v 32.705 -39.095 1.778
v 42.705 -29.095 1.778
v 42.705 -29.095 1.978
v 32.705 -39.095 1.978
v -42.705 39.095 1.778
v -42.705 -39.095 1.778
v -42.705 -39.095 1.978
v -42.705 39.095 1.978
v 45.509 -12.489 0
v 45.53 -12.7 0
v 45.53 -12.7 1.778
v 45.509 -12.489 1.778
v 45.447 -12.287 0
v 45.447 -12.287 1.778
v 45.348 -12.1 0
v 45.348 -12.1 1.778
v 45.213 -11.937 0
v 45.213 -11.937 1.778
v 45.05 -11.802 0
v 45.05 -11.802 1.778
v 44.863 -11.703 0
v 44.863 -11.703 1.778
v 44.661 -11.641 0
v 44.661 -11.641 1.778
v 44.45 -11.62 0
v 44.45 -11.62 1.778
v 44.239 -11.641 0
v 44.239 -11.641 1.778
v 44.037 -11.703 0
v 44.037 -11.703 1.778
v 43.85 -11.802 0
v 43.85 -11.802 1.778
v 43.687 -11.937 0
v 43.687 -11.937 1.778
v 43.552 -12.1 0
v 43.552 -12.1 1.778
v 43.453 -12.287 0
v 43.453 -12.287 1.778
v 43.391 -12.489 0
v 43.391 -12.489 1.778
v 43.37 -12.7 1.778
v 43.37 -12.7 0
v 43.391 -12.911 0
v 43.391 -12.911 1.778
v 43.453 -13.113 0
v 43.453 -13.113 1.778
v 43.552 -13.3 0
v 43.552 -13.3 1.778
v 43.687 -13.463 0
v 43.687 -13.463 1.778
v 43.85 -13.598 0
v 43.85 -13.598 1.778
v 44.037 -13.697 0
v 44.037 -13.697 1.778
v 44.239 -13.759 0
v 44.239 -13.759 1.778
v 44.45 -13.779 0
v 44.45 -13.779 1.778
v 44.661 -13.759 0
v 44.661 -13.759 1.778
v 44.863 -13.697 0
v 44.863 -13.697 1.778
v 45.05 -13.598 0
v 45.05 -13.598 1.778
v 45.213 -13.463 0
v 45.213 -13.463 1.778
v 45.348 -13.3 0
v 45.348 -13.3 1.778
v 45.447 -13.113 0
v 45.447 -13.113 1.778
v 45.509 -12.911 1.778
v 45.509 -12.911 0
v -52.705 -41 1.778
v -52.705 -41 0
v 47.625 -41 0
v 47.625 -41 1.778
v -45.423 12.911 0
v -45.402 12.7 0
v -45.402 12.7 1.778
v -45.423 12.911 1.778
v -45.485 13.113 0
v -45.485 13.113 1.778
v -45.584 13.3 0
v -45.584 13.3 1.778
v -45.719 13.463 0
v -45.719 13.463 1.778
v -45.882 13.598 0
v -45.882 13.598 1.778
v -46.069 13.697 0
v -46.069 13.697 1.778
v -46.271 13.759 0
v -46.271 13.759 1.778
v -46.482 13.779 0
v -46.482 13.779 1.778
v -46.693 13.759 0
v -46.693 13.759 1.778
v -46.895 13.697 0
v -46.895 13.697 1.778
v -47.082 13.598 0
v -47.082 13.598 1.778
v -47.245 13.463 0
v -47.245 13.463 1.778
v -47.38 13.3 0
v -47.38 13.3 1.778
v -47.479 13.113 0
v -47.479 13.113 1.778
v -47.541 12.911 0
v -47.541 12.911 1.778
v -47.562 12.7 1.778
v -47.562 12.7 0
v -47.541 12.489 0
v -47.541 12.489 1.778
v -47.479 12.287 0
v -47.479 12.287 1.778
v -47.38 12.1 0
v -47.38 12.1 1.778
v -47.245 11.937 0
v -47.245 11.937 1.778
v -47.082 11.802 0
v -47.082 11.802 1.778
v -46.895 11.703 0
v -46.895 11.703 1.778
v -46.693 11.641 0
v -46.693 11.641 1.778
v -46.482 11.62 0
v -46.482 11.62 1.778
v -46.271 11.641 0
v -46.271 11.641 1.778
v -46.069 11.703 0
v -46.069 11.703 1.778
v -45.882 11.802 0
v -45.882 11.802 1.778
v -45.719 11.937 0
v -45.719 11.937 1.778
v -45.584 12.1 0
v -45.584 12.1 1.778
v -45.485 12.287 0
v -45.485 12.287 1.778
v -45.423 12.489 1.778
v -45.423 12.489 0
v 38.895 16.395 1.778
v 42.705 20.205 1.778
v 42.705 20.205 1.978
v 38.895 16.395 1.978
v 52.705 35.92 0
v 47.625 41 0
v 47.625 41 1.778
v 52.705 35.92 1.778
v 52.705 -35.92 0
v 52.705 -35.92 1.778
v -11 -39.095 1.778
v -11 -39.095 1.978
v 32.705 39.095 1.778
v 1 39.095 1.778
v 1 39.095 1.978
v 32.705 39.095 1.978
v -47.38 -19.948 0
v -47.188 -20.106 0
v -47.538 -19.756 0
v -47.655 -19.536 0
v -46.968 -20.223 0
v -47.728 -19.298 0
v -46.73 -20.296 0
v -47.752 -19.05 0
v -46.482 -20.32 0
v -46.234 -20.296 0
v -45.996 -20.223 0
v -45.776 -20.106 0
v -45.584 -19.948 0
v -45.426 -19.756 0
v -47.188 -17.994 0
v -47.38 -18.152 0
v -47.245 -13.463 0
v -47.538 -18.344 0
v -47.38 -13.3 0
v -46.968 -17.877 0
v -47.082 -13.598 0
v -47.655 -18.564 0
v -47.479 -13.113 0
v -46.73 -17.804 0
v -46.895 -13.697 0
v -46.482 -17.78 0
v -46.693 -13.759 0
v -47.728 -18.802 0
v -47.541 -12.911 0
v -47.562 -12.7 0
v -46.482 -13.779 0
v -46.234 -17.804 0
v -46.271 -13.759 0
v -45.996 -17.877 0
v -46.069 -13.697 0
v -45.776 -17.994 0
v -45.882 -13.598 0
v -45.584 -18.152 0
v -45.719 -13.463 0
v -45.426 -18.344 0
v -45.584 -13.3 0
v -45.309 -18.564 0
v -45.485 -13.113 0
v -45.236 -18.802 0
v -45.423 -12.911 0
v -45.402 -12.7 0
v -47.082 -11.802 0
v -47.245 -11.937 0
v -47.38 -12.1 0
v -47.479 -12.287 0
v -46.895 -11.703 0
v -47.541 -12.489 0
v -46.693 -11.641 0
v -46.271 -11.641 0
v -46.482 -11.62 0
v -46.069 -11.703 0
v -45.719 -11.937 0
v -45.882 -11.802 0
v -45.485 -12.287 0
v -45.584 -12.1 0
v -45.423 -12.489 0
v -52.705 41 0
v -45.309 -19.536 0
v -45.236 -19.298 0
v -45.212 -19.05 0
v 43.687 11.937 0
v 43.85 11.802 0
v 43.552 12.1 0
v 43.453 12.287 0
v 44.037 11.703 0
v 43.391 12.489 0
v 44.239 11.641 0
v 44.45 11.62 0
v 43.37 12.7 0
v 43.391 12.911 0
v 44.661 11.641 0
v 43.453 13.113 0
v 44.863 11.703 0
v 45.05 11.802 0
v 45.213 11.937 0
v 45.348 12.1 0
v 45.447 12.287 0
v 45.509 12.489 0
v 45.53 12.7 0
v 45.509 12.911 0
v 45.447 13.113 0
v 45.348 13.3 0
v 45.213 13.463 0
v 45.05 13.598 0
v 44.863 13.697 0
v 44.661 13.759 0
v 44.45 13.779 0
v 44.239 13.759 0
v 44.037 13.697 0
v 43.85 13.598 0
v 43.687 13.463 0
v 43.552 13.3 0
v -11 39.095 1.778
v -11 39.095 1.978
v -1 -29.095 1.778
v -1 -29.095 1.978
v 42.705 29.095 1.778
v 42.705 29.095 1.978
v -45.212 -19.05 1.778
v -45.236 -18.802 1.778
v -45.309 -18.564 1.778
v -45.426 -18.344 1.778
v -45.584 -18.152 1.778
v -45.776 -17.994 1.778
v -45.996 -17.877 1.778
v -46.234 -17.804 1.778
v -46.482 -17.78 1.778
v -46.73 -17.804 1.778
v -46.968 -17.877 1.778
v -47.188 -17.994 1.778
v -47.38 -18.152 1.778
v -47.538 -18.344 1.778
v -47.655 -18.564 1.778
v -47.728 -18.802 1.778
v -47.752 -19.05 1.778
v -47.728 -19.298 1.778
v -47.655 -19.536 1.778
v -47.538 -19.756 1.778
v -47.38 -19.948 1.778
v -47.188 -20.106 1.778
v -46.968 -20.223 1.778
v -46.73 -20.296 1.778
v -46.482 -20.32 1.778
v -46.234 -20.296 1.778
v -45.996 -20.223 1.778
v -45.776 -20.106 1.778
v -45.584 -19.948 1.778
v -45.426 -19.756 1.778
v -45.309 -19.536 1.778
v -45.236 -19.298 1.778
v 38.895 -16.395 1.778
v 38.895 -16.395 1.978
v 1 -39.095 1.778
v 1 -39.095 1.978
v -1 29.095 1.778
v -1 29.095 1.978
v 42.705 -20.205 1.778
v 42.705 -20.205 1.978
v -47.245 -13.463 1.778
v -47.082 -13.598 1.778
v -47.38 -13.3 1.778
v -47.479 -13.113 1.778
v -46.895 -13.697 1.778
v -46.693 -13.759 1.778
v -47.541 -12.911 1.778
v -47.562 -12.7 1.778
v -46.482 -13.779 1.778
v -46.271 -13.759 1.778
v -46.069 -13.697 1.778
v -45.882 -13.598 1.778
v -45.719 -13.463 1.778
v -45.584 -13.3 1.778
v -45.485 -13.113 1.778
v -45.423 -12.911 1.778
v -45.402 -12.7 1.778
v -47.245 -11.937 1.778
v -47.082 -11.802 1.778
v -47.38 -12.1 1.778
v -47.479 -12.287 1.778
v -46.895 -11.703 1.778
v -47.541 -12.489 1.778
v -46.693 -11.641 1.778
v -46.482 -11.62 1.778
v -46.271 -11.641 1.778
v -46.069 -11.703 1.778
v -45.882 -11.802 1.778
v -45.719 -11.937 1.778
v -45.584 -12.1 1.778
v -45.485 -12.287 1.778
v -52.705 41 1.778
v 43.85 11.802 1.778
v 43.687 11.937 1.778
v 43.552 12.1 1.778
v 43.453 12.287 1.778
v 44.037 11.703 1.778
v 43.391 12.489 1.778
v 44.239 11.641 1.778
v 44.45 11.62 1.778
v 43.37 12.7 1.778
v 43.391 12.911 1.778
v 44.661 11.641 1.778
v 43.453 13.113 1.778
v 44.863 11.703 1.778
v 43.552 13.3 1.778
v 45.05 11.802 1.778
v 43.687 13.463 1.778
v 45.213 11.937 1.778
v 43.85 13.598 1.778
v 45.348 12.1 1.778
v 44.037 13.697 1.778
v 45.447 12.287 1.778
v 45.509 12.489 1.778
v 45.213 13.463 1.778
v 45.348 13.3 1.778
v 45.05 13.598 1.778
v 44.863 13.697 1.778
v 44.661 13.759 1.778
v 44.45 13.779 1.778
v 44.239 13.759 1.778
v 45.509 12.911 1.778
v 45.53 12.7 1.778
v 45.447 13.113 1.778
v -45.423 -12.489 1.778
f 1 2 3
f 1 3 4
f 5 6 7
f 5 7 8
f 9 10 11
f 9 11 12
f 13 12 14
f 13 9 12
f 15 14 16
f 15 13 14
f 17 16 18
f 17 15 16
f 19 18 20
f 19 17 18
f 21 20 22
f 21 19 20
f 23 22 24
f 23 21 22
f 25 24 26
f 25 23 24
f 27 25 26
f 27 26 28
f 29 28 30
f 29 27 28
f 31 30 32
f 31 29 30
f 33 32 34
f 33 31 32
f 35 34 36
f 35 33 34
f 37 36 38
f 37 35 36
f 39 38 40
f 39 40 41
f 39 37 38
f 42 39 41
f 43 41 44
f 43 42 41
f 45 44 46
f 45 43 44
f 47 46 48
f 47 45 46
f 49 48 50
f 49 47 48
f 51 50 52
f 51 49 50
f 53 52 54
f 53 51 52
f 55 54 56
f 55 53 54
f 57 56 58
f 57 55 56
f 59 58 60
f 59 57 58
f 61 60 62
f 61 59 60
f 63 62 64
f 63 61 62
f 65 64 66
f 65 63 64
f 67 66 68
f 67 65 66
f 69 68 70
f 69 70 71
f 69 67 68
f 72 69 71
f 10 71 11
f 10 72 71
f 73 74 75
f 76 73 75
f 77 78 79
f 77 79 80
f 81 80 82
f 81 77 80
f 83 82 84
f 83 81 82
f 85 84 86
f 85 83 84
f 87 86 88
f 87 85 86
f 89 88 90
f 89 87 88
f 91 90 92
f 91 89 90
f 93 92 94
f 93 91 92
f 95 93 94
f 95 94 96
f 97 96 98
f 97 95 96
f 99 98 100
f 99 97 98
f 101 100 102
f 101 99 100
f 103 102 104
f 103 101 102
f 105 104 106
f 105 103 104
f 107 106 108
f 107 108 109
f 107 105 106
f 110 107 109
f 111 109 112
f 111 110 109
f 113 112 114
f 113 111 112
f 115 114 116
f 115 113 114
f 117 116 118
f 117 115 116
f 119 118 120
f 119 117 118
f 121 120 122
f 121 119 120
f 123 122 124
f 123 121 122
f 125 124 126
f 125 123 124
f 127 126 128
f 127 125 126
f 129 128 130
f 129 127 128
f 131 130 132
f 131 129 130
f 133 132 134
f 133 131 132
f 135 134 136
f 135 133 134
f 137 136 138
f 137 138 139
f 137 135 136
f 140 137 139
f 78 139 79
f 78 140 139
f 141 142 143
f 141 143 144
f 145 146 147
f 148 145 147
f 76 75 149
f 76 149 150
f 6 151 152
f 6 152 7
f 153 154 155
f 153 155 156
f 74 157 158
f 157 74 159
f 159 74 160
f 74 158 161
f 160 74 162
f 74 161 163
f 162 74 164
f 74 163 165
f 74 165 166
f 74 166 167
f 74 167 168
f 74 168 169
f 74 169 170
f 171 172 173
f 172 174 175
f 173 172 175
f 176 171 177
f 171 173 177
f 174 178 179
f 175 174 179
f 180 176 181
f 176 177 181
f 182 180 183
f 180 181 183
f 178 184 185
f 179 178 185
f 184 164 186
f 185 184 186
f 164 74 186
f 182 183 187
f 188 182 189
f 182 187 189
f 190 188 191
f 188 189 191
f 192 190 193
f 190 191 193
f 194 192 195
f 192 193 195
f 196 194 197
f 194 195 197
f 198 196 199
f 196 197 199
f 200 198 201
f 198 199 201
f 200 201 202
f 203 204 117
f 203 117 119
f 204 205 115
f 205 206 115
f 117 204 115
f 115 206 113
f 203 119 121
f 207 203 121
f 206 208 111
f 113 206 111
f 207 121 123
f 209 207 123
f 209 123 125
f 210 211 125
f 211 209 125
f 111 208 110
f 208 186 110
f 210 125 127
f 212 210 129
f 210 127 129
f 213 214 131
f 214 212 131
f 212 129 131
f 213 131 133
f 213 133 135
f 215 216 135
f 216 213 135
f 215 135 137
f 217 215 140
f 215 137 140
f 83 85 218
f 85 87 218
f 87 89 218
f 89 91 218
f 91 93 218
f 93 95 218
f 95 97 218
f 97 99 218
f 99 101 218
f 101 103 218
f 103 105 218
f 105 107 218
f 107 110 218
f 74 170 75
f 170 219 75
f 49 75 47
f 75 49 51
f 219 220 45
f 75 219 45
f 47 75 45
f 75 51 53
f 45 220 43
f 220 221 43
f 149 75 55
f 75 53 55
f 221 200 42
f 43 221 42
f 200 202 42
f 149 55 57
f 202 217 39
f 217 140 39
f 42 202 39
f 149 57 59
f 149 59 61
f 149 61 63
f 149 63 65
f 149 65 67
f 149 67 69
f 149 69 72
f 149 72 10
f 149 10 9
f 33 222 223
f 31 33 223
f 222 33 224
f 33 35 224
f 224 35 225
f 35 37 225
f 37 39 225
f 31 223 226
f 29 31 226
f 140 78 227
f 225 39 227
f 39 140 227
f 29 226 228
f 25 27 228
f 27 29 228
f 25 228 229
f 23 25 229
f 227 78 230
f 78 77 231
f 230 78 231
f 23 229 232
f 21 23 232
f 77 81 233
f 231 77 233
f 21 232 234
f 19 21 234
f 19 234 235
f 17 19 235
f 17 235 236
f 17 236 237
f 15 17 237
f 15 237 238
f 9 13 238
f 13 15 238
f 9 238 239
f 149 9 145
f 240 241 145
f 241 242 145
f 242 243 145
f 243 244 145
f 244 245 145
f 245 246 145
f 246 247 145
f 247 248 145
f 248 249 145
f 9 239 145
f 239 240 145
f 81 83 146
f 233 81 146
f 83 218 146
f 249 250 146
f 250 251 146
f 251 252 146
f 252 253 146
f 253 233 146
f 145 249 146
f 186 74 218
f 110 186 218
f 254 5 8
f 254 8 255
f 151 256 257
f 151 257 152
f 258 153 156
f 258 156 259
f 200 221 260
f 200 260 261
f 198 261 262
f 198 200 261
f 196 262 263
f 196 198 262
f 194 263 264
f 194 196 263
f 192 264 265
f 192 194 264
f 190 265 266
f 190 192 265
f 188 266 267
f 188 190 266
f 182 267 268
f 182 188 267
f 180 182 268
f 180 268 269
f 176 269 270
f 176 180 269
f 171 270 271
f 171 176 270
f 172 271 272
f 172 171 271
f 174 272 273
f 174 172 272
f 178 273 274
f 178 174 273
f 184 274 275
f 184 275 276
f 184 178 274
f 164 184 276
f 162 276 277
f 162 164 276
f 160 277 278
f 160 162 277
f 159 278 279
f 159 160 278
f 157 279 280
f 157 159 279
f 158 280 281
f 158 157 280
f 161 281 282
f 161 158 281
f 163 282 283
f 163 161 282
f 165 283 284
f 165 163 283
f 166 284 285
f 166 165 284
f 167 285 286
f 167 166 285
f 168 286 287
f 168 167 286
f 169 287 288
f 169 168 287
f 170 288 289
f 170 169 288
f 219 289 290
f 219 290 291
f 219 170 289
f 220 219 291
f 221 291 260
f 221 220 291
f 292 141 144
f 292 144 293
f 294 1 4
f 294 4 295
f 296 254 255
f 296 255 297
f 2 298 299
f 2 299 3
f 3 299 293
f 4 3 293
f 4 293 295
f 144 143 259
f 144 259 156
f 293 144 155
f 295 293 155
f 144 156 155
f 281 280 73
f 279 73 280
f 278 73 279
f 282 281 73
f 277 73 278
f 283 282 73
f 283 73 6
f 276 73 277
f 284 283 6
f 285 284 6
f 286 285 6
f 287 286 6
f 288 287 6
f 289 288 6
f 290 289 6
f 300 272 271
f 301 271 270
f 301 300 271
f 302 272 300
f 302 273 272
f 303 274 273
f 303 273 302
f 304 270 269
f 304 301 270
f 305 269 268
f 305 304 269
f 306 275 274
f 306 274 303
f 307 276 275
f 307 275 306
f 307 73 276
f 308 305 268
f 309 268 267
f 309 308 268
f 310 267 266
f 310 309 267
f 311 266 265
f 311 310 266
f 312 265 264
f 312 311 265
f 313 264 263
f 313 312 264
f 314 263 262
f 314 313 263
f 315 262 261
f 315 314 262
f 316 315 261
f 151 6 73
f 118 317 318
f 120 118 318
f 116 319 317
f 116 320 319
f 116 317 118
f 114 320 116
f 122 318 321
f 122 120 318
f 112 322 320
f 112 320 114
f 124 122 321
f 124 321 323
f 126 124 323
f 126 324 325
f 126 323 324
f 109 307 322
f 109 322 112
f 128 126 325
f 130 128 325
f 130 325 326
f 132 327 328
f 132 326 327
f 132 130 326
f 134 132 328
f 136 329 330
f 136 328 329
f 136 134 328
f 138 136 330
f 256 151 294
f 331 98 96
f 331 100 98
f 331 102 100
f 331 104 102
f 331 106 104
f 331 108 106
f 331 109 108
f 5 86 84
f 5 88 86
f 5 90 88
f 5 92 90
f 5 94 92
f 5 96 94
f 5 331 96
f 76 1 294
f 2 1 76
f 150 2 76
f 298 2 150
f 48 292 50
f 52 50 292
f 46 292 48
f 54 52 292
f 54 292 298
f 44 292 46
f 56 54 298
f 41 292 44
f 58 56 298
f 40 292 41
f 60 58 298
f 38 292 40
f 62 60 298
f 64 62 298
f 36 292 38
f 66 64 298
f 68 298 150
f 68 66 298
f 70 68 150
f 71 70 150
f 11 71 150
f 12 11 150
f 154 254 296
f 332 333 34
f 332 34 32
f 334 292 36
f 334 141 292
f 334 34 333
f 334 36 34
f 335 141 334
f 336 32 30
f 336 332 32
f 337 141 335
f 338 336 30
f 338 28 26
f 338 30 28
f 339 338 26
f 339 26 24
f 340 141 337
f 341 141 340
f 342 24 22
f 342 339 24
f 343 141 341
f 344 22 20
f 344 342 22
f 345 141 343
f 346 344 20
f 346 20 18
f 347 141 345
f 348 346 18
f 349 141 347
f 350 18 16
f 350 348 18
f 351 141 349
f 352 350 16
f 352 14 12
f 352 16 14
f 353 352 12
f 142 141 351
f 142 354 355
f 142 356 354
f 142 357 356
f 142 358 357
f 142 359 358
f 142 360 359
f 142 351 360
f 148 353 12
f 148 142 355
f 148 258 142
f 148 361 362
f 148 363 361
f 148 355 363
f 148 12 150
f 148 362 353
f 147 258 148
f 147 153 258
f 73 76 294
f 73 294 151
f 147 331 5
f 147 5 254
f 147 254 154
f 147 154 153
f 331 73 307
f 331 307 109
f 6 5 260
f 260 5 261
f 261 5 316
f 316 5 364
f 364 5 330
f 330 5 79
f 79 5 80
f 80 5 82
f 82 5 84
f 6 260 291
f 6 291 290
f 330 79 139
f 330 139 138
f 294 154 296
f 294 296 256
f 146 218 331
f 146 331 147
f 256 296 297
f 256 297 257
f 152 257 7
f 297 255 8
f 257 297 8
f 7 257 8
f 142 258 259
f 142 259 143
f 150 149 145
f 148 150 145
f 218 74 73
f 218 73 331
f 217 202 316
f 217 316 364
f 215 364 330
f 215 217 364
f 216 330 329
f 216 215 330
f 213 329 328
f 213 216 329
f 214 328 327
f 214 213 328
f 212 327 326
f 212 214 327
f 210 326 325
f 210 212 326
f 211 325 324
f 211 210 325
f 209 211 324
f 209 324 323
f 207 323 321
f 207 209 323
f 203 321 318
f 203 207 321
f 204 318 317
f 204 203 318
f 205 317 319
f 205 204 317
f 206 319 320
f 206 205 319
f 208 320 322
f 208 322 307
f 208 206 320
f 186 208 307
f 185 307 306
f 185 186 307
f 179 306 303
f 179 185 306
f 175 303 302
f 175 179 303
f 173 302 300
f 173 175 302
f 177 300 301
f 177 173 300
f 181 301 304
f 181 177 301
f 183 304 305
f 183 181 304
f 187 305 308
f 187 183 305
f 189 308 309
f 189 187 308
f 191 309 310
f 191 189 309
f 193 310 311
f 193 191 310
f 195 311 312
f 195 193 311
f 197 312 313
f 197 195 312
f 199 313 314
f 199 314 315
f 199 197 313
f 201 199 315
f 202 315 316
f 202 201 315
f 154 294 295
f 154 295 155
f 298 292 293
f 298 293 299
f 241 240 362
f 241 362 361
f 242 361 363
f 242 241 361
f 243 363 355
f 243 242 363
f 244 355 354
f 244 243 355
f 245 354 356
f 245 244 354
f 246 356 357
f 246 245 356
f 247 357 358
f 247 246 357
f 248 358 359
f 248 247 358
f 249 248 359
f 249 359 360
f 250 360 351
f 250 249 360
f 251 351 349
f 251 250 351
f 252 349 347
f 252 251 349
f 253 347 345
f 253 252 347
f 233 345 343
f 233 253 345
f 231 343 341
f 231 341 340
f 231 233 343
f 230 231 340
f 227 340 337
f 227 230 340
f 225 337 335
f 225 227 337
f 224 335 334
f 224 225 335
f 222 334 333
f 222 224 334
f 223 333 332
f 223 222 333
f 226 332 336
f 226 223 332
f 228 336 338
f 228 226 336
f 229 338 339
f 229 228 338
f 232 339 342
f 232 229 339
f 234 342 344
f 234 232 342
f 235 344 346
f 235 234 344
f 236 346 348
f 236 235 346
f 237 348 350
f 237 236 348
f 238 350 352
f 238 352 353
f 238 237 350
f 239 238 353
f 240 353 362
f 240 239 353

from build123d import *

# Parameters (mm, degrees)
SKETCH1_W           = 105.41
SKETCH1_H           = 82
SKETCH1_R           = 1.0795
SKETCH1_R_2         = 1.27
BOSS_EXTRUDE1_DEPTH = 1.778
BOSS_EXTRUDE2_DEPTH = 0.2
CHAMFER2_SIZE       = 5.08


with BuildPart() as part:
    # Sketch1 → Boss-Extrude1 (new body)
    with BuildSketch(Plane.XY):
        Rectangle(SKETCH1_W, SKETCH1_H)
        with Locations((44.45, 12.7)):
            Circle(SKETCH1_R, mode=Mode.SUBTRACT)
        with Locations((44.45, -12.7)):
            Circle(SKETCH1_R, mode=Mode.SUBTRACT)
        with Locations((-46.482, 12.7)):
            Circle(SKETCH1_R, mode=Mode.SUBTRACT)
        with Locations((-46.482, -12.7)):
            Circle(SKETCH1_R, mode=Mode.SUBTRACT)
        with Locations((-46.482, -19.05)):
            Circle(SKETCH1_R_2, mode=Mode.SUBTRACT)
    extrude(amount=BOSS_EXTRUDE1_DEPTH)

    # Sketch2 → Boss-Extrude2 (add)
    with BuildSketch(Plane.XY.offset(1.778)):
        Polygon((-11, 39.095), (-1, 29.095), (-1, -29.095), (-11, -39.095), (-42.705, -39.095), (-42.705, 39.095), align=None)
        Polygon((42.705, 20.205), (38.895, 16.395), (38.895, -16.395), (42.705, -20.205), (42.705, -29.095), (32.705, -39.095), (1, -39.095), (1, 39.095), (32.705, 39.095), (42.705, 29.095), align=None)
    extrude(amount=BOSS_EXTRUDE2_DEPTH)

    # Chamfer2
    chamfer2_edges = [part.edges().sort_by_distance(p)[0] for p in [
        (52.705, 41, 0.889),
        (52.705, -41, 0.889),
    ]]
    chamfer(chamfer2_edges, length=CHAMFER2_SIZE)


solid = part.part
